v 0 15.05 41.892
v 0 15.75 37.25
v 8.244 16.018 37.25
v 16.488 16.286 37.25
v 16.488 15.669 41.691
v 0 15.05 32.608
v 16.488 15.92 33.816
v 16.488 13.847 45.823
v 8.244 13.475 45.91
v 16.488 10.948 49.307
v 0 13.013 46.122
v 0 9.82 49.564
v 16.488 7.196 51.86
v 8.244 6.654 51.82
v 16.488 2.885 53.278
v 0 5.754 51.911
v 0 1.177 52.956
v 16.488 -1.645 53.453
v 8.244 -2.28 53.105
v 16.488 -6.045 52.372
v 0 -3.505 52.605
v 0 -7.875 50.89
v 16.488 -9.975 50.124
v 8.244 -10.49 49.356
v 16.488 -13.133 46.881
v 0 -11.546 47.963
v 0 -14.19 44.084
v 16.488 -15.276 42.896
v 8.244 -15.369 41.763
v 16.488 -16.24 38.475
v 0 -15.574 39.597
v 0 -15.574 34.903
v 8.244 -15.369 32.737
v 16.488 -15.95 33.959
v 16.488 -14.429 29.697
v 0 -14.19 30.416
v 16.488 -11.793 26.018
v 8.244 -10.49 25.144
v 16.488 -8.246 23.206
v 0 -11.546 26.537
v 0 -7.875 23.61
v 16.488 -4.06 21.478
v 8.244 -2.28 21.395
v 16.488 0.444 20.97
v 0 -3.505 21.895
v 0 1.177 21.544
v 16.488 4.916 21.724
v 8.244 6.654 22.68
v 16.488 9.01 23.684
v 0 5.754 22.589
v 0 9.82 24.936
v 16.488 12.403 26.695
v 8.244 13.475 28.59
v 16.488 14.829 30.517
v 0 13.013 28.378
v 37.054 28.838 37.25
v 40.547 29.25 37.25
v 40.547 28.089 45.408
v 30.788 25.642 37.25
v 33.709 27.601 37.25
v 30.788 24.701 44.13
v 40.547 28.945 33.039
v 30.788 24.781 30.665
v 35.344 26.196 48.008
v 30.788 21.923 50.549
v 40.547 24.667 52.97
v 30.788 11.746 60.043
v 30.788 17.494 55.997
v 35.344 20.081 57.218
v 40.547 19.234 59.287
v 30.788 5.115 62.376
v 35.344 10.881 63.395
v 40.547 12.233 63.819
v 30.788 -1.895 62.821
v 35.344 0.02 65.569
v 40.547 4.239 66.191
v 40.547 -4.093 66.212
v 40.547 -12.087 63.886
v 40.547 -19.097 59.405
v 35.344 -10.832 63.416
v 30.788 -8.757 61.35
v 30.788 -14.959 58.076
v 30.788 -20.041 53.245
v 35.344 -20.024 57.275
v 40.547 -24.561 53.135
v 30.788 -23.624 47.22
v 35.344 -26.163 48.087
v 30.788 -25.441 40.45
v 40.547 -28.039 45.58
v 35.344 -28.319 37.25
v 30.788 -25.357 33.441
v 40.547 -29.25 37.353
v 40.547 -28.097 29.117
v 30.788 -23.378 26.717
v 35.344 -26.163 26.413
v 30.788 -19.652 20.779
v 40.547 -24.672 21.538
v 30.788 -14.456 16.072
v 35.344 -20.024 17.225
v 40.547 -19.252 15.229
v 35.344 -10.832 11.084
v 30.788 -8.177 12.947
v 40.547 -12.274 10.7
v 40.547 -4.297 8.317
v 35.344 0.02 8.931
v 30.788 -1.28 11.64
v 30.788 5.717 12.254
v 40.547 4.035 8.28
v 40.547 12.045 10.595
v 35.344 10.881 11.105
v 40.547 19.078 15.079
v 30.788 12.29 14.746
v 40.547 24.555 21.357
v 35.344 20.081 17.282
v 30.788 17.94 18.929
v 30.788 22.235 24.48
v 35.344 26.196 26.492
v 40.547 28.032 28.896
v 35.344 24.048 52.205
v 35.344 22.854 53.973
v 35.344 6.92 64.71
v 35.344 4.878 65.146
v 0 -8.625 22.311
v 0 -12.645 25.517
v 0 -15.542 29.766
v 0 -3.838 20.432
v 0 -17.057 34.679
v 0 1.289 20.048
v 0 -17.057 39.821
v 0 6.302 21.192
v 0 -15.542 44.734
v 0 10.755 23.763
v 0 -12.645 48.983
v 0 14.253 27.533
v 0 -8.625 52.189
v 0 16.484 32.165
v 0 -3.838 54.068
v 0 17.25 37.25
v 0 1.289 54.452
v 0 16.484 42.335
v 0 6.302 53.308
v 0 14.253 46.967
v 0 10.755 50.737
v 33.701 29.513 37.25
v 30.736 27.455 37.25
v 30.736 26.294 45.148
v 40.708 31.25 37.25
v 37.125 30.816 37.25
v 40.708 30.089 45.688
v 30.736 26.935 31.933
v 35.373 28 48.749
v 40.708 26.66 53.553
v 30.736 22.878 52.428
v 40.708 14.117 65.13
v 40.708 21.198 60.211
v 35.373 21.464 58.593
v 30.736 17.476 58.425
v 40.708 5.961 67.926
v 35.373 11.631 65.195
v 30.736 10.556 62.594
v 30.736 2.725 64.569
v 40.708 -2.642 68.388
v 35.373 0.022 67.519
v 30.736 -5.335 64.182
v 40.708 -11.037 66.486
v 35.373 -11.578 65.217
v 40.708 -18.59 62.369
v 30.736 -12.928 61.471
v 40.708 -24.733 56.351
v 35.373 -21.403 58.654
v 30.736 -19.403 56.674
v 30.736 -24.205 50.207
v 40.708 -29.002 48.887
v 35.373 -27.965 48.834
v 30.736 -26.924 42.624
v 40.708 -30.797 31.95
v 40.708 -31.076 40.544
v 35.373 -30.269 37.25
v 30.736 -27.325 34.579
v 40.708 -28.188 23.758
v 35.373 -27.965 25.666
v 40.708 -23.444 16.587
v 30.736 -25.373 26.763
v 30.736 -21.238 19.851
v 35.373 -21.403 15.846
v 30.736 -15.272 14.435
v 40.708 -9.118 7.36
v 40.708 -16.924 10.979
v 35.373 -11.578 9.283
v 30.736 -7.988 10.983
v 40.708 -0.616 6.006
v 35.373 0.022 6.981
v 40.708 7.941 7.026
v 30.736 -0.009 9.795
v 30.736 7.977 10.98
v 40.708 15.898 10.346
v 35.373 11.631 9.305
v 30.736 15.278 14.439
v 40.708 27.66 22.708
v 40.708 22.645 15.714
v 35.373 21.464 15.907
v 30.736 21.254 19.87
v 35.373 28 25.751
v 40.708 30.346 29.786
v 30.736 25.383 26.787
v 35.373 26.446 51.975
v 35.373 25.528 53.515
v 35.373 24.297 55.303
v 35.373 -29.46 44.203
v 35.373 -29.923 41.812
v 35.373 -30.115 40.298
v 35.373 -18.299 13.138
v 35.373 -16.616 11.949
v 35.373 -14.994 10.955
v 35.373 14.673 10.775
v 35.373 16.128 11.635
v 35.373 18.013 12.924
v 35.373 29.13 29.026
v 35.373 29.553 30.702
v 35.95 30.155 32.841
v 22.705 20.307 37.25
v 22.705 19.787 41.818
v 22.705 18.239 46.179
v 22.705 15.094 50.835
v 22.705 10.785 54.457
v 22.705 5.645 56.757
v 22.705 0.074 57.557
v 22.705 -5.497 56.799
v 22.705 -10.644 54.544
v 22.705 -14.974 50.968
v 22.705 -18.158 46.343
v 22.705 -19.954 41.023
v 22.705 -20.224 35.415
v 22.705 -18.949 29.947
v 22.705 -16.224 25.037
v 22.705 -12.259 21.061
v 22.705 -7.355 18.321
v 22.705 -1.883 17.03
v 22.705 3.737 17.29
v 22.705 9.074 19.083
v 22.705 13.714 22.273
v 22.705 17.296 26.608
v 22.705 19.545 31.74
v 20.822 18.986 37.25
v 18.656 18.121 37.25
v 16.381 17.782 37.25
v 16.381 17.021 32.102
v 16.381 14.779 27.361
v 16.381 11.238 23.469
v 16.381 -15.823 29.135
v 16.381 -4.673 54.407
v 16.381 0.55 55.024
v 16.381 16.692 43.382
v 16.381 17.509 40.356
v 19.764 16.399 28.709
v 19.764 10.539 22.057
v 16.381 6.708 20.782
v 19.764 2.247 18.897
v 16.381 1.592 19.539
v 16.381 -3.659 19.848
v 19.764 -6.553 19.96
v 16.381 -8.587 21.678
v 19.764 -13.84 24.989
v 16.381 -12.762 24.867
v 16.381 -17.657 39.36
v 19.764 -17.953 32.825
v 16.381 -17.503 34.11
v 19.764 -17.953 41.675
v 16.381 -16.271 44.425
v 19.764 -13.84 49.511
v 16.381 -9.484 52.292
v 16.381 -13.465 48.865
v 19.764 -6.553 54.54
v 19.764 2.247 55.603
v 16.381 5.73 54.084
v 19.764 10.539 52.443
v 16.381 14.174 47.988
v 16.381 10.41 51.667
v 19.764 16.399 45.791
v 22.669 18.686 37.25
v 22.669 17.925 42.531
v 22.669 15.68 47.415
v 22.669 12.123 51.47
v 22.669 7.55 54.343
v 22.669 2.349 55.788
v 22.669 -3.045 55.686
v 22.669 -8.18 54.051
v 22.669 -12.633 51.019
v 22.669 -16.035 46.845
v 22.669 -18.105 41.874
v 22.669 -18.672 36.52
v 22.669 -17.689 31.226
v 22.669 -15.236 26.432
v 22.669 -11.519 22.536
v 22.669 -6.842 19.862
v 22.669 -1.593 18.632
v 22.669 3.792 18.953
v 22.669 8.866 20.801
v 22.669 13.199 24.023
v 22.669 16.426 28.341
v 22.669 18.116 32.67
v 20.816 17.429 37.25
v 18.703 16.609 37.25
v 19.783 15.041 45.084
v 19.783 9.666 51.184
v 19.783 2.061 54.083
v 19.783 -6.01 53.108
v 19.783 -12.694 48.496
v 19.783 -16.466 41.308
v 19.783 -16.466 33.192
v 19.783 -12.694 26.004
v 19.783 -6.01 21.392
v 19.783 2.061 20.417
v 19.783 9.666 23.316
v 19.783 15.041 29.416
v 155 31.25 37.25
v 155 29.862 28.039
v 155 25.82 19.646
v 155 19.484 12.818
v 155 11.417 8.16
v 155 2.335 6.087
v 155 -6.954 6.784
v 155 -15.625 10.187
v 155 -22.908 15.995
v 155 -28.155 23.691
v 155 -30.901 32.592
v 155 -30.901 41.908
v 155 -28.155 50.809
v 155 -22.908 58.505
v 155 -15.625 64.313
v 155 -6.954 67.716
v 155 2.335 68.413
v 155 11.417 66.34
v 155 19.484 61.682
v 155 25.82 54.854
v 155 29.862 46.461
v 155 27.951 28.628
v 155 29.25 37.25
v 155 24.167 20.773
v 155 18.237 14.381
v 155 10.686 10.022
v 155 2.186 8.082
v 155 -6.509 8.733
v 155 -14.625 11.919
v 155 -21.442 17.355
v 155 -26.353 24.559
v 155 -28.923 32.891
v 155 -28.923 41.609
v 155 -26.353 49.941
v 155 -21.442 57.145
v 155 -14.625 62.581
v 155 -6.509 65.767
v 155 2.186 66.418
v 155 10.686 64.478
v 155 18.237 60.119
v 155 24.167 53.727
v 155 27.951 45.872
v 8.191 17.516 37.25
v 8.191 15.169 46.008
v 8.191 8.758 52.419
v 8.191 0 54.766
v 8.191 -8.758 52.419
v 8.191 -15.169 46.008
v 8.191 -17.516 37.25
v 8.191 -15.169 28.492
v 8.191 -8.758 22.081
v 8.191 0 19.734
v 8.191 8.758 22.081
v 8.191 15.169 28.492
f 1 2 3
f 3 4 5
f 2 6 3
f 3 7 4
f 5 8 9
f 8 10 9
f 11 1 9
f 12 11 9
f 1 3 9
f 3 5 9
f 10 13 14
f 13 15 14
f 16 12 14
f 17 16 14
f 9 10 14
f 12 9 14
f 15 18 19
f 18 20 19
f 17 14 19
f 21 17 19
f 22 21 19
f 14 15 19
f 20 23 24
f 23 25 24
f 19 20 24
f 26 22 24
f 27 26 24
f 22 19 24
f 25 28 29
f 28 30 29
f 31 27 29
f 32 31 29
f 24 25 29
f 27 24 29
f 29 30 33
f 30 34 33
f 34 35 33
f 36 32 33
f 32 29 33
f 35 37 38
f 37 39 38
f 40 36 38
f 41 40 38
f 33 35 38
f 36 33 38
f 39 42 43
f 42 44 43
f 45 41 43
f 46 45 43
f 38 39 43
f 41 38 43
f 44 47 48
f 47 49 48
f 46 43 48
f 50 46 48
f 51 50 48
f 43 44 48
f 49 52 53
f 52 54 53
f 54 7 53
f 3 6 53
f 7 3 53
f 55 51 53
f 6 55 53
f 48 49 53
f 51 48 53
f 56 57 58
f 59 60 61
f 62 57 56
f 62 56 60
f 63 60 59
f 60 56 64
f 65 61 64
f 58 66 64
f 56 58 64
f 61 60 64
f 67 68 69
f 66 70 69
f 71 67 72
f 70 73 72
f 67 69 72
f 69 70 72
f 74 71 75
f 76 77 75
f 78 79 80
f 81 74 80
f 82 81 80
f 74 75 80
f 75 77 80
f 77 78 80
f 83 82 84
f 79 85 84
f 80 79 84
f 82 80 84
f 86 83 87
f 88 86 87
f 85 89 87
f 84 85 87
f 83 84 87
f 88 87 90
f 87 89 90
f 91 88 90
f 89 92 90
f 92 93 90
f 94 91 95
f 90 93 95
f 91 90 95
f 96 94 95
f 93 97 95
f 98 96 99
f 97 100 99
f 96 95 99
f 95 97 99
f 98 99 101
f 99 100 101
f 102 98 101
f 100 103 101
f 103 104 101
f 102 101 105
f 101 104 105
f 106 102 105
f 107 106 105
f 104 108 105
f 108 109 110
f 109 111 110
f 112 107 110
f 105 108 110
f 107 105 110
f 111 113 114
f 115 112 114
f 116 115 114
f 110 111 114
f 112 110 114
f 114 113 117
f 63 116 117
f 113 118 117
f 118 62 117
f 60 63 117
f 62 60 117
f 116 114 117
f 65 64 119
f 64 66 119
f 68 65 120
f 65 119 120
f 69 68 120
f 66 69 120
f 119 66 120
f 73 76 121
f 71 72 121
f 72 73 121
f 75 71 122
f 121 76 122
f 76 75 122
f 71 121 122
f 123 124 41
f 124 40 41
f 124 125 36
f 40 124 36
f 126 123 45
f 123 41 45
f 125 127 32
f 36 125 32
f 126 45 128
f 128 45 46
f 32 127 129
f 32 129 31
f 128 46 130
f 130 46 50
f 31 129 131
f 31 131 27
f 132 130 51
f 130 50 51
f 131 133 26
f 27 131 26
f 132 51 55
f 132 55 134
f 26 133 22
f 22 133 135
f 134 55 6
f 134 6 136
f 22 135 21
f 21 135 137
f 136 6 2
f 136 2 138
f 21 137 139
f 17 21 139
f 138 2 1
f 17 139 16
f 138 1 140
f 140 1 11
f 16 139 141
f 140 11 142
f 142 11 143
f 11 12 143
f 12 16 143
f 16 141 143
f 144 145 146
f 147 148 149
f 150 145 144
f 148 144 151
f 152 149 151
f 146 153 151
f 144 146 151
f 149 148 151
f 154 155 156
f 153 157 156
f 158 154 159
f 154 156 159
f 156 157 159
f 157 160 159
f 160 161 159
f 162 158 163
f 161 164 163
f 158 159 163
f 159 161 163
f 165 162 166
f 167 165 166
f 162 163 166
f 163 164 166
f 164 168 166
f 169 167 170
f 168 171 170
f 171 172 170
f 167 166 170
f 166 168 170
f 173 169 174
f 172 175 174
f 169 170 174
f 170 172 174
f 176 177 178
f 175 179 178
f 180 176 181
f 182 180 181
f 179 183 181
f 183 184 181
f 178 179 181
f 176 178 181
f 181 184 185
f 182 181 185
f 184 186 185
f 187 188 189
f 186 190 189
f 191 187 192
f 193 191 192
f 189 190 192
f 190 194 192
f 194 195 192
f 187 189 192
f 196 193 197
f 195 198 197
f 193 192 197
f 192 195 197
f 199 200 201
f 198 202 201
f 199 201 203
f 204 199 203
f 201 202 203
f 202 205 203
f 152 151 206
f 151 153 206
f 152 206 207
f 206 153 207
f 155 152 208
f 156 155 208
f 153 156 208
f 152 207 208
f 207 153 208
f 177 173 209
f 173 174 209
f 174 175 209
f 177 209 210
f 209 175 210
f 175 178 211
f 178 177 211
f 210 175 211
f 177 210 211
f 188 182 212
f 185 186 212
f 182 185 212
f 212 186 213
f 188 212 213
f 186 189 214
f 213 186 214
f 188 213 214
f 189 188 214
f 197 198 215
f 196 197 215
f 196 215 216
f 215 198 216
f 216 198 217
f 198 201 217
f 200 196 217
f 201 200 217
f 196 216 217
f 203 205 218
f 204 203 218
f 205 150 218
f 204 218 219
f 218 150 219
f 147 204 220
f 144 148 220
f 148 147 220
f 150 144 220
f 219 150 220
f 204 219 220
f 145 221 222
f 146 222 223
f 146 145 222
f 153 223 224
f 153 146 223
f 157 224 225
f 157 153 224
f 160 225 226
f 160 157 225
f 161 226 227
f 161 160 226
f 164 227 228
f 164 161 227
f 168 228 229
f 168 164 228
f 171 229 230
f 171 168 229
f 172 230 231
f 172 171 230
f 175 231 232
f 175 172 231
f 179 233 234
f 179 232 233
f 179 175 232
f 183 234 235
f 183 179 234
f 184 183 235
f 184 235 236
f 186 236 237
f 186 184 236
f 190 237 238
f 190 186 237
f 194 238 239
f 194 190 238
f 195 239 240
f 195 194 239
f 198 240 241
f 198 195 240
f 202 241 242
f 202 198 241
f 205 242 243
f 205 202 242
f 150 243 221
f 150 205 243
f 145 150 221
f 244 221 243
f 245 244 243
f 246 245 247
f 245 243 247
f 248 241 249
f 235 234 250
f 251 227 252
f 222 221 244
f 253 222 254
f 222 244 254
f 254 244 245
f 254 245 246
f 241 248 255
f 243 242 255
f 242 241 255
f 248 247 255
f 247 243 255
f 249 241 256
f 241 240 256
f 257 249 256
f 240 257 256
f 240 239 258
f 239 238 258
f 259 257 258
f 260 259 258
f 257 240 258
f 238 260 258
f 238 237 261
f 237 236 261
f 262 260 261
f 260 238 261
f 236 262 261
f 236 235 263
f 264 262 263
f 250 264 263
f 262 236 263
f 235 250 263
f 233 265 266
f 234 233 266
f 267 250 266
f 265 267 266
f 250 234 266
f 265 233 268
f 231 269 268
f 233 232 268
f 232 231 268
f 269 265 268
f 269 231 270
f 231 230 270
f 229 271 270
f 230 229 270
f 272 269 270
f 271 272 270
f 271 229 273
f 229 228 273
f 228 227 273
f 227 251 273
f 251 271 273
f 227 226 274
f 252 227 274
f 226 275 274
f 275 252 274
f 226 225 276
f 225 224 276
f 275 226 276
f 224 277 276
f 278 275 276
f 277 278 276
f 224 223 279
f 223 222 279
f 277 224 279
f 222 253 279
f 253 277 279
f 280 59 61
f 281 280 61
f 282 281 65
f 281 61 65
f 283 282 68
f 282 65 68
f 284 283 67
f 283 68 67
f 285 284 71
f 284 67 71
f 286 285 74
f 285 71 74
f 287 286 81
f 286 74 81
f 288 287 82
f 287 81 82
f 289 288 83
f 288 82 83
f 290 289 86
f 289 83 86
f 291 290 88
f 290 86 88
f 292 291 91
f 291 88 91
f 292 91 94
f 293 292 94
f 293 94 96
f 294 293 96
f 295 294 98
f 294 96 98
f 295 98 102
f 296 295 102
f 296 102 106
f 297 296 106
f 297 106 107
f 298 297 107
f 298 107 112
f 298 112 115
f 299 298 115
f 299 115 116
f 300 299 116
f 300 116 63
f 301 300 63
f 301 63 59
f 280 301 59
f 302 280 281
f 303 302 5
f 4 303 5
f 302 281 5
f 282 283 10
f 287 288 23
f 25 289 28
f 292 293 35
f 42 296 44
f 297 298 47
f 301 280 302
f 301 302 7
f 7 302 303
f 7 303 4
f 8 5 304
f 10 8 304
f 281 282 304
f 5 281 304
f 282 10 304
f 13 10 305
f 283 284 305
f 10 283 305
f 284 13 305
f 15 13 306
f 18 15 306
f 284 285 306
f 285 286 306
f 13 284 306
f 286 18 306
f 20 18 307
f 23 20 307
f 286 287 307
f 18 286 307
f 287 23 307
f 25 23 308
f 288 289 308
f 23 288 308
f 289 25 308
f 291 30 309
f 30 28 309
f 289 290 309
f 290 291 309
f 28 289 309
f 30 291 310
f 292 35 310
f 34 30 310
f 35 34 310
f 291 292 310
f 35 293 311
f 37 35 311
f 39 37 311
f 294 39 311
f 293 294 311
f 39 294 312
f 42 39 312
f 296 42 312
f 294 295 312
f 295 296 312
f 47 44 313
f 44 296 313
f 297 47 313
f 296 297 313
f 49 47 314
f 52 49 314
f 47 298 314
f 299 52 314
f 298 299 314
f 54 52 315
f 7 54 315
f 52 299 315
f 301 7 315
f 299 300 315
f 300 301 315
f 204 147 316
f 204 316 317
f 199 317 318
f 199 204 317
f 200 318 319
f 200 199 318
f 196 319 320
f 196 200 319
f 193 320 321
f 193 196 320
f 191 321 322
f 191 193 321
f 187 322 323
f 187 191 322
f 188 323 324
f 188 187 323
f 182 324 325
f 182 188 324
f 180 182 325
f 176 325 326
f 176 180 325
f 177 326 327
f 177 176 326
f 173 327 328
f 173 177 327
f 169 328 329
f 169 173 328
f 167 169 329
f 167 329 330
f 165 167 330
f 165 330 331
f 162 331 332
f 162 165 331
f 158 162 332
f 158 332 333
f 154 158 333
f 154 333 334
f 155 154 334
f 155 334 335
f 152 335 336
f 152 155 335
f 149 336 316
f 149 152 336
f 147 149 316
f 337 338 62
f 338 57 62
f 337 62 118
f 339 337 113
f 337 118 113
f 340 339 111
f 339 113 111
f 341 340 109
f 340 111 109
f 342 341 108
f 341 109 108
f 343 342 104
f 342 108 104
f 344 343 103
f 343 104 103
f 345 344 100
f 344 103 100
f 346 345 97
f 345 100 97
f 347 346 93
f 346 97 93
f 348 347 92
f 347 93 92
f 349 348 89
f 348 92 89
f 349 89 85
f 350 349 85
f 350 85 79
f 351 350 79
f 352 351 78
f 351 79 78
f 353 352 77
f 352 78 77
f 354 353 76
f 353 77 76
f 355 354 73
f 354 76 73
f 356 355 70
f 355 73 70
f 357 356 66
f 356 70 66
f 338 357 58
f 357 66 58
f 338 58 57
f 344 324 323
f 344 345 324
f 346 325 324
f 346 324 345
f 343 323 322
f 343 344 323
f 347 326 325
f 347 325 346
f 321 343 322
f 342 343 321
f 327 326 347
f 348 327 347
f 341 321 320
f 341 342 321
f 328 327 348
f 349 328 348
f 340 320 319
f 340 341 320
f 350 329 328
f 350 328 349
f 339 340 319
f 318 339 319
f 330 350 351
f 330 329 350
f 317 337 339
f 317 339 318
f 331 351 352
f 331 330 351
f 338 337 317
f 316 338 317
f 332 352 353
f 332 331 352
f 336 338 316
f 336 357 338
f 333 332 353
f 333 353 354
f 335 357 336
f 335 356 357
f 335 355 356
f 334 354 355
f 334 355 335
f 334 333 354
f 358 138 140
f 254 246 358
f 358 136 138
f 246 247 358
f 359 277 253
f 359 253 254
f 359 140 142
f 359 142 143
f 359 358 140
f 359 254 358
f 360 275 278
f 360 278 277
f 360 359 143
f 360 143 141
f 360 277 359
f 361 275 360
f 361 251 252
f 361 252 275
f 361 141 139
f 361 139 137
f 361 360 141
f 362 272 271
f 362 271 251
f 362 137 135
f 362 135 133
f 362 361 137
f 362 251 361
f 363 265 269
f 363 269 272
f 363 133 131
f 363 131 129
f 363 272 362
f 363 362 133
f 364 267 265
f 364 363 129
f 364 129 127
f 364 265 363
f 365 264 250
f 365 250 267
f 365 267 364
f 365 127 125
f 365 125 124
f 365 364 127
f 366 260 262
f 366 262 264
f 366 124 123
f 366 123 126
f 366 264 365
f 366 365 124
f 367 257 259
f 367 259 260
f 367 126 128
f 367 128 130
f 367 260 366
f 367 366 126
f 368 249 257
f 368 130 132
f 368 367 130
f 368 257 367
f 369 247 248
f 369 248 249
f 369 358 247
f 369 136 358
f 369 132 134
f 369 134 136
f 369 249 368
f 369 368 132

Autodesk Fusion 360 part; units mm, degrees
sketch "Sketch1" plane through (0, 0, 0) normal (0, 1, 0) x (1, 0, 0)
  line L0 (0, 0) -> (0, -20)
  line L1 (0, 0) -> (155, 0)
  line L2 (155, 0) -> (155, 20)
  line L3 (155, 20) -> (182.5, 20)
  line L4 (182.5, 20) -> (182.5, 36)
  line L5 (182.5, 36) -> (204.5, 36)
  line L6 (204.5, 36) -> (204.5, 41)
  line L7 (204.5, 41) -> (104.5, 41)
  dimension "d1" = 20
  dimension "d2" = 155
  dimension "d11" = 20
  dimension "d12" = 27.5
  dimension "d13" = 16
  dimension "d14" = 22
  dimension "d15" = 5
  dimension "d16" = 100
sketch "Sketch2" plane through (0, 0, 0) normal (1, 0, 0) x (0, 1, 0)
  line L0 (0, 0) -> (0, 20)
  line L1 (0, 20) -> (0, 37.25) construction
  circle A0 centre (0, 37.25) radius 17.25
  circle A1 centre (0, 37.25) radius 15.75
  point P0 (0, 20)
  dimension "d3" = 17.25
  dimension "d4" = -1.5
ref_plane "WorkPlane1" through (20, 0, 0) normal (1, 0, 0) x (0, 1, 0)
sketch "Sketch3" plane through (20, 0, 0) normal (1, 0, 0) x (0, 1, 0)
  circle A0 centre (0, 37.25) radius 15.75 construction
  circle A1 centre (0, 37.25) radius 17.9
  circle A2 centre (0, 37.25) radius 16.4
  dimension "d6" = 35.8
  dimension "d7" = -1.5
loft "Loft1" add profiles "Sketch2", "Sketch3" section 1 section 2
loft "Loft2" cut profiles "Sketch3", "Sketch2" section 1 contours A2 section 2 contours A1
ref_plane "WorkPlane2" through (35, 0, 37.25) normal (1, 0, 0) x (0, 1, 0)
sketch "Sketch4" plane through (35, 0, 0) normal (1, 0, 0) x (0, 1, 0)
  circle A0 centre (0, 37.25) radius 16.4 construction
  circle A1 centre (0, 37.25) radius 29.25
  circle A2 centre (0, 37.25) radius 31.25
  dimension "d9" = 58.5
  dimension "d10" = 2
loft "Loft3" add profiles "Sketch3", "Sketch4" section 1 contours A1 | A2 section 2 contours A1 | A2
loft "Loft4" cut profiles "Sketch4", "Sketch3" section 1 contours A1 section 2 contours A2
extrude "Extrude1" add sketch "Sketch4" along normal blind 120
fillet "Fillet1" radius 10 2 edges at (20, -15.2902, 43.1805) (20, -16.6887, 43.7229)
fillet "Fillet2" radius 15 2 edges at (35, -27.2706, 47.8273) (35, -29.1352, 48.5505)
equation "d3 = ( 34.5 / 2 ) * 1 mm"
